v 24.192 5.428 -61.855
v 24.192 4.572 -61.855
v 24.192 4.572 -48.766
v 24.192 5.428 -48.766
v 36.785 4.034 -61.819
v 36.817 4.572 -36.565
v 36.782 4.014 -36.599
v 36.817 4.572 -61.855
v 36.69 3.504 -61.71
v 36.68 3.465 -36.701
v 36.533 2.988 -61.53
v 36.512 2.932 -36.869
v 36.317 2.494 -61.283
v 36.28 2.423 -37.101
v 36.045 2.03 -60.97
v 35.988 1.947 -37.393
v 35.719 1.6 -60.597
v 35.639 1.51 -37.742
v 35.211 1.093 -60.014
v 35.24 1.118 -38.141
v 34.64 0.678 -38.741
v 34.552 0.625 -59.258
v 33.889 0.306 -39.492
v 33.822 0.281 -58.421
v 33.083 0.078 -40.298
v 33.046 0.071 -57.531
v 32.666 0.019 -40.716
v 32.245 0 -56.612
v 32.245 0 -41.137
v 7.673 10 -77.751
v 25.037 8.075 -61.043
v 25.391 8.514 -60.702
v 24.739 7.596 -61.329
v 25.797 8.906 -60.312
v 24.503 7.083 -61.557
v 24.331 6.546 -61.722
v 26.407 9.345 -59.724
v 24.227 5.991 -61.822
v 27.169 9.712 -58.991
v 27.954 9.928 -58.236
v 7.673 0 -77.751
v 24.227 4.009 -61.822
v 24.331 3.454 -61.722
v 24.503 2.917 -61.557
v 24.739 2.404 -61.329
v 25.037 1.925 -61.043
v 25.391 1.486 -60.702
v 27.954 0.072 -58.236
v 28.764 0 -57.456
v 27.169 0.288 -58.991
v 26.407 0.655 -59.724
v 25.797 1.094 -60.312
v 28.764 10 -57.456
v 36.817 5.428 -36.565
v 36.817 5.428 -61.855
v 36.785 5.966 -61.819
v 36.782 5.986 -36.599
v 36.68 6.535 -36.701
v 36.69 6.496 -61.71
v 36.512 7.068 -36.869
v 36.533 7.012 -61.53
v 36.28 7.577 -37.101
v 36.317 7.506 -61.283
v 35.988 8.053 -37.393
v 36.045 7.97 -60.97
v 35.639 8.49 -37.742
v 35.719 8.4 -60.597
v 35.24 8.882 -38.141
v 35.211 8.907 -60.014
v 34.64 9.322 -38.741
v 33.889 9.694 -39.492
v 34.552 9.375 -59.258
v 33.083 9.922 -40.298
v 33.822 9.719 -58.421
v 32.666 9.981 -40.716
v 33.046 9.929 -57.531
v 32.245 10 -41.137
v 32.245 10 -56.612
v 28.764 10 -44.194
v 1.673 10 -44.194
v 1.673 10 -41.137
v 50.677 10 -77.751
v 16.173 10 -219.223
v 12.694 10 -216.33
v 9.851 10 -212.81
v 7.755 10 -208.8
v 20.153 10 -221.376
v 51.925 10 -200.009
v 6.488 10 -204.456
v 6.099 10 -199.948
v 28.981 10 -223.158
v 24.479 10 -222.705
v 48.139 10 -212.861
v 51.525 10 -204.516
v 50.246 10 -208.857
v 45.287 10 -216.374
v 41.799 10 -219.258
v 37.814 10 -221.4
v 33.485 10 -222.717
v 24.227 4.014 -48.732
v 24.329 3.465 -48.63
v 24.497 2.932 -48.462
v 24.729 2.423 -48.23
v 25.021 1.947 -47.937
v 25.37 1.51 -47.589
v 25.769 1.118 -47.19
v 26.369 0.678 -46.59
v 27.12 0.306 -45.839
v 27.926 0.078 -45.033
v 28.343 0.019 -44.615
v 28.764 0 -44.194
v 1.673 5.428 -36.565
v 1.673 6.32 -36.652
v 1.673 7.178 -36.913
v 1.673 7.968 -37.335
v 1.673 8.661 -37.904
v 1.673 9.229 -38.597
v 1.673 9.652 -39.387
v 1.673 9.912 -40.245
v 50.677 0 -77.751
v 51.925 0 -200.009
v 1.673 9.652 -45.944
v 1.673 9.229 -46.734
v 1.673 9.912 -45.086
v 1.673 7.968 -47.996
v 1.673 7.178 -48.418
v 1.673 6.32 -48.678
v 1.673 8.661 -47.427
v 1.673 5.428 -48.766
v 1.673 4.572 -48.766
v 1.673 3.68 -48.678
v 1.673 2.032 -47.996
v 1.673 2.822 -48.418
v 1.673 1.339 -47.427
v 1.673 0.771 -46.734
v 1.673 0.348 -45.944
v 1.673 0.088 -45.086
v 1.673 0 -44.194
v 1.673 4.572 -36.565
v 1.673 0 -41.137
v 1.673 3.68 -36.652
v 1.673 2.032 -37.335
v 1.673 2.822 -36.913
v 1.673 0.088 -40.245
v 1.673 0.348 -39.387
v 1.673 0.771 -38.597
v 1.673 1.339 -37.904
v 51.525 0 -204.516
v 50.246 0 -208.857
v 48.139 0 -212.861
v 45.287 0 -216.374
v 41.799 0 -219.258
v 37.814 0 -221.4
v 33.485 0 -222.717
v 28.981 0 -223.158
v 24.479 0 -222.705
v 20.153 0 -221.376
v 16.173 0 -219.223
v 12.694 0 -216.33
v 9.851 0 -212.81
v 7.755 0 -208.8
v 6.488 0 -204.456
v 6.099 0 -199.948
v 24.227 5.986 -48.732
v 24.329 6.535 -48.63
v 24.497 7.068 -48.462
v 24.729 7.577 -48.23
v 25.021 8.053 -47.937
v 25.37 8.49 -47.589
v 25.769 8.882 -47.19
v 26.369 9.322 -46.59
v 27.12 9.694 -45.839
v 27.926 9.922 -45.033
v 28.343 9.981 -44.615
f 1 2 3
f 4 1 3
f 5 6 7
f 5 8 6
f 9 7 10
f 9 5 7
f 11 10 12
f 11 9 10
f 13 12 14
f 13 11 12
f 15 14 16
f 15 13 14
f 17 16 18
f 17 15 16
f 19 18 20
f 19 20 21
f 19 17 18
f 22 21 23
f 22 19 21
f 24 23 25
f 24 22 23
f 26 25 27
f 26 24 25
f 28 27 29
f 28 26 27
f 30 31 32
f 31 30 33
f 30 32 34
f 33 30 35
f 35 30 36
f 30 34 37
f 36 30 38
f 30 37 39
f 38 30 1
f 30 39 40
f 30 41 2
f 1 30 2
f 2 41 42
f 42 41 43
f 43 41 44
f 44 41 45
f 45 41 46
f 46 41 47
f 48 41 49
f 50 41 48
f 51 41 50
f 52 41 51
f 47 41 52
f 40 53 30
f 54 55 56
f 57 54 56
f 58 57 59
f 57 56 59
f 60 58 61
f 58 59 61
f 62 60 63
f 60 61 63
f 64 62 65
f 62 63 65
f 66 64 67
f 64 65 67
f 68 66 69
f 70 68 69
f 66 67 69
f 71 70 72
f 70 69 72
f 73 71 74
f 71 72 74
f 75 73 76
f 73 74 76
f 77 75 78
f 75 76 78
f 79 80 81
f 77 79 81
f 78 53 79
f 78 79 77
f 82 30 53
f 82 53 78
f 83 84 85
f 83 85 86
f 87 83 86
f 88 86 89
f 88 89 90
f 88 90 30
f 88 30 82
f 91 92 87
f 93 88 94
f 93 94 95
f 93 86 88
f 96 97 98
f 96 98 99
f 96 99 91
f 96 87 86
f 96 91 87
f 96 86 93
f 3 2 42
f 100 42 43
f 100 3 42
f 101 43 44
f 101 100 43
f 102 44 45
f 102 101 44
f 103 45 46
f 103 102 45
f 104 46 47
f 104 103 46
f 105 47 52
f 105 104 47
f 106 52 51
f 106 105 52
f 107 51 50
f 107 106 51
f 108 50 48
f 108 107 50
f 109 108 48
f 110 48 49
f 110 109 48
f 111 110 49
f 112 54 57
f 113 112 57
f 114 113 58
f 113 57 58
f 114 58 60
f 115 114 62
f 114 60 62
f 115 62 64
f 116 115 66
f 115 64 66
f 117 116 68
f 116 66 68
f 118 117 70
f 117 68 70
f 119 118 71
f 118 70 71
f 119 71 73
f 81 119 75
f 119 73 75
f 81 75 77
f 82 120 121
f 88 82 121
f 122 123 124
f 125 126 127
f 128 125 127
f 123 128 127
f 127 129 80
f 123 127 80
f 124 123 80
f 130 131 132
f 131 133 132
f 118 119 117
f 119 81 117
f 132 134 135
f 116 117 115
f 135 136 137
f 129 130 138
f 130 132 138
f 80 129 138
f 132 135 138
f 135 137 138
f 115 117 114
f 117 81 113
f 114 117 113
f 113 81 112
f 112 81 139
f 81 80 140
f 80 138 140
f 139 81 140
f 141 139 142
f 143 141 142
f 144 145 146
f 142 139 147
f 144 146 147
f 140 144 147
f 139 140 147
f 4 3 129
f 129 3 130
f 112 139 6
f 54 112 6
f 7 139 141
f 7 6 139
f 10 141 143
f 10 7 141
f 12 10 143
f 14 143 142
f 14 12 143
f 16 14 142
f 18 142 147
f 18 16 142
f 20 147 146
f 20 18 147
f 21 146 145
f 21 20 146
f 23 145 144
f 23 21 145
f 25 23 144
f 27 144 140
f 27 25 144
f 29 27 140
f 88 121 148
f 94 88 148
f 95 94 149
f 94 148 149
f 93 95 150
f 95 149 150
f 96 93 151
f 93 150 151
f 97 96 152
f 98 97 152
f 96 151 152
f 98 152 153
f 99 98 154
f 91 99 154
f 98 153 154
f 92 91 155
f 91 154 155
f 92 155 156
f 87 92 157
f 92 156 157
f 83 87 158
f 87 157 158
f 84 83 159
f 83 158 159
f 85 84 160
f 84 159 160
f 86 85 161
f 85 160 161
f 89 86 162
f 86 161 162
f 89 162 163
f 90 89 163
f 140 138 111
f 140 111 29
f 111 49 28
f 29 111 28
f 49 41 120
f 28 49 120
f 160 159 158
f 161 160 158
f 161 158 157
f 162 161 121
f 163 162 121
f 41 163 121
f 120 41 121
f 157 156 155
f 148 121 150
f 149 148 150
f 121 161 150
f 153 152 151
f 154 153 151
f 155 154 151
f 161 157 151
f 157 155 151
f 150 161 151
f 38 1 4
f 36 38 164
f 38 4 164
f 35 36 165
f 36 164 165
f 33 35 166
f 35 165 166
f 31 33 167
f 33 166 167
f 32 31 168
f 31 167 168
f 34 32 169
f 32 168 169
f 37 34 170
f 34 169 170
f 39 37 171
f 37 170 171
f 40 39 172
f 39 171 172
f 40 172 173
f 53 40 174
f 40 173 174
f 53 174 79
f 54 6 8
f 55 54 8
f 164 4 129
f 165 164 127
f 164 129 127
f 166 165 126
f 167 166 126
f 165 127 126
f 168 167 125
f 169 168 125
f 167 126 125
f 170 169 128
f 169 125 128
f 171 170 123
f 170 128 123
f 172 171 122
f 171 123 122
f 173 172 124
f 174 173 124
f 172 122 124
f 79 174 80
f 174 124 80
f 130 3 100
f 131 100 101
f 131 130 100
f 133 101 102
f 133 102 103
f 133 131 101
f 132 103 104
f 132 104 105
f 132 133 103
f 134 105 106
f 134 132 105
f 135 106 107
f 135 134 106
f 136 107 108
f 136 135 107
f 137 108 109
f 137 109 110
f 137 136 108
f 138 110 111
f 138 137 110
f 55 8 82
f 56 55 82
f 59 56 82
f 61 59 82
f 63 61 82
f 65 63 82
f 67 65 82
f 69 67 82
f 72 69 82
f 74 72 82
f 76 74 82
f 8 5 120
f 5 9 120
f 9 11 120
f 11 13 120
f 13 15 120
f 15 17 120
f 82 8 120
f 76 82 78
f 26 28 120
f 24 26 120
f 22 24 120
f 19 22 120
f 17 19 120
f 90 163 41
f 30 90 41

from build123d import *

# Parameters (mm, degrees)
BOSS_EXTRUDE1_DEPTH = 10
FILLET1_R           = 4.572


with BuildPart() as part:
    # Sketch2 → Boss-Extrude1 (new body)
    with BuildSketch(Plane(origin=(0, 0, 0), x_dir=(1, 0, 0), z_dir=(0, 1, 0))):
        with BuildLine():
            Line((6.098836138, 199.947644416), (7.673025909, 77.750683868))
            Line((7.673025909, 77.750683868), (24.192411242, 61.855234605))
            Line((24.192411242, 61.855234605), (24.192411242, 48.766267951))
            Line((24.192411242, 48.766267951), (1.672918099, 48.766267951))
            Line((1.672918099, 48.766267951), (1.672918099, 36.564568547))
            Line((1.672918099, 36.564568547), (36.816624548, 36.564568547))
            Line((36.816624548, 36.564568547), (36.816624548, 61.855234605))
            Line((36.816624548, 61.855234605), (50.677233754, 77.750683868))
            Line((50.677233754, 77.750683868), (51.925307167, 200.008903269))
            ThreePointArc((51.925307167, 200.008903269), (28.981086555, 223.157579607), (6.098836138, 199.947644416))
        make_face()
    extrude(amount=BOSS_EXTRUDE1_DEPTH)

    # Fillet1
    fillet1_edges = [part.edges().sort_by_distance(p)[0] for p in [
        (36.816624548, 0, -49.209901576),
        (19.244771323, 0, -36.564568547),
        (12.932664671, 0, -48.766267951),
        (24.192411242, 0, -55.310751278),
        (24.192411242, 10, -55.310751278),
        (12.932664671, 10, -48.766267951),
        (19.244771323, 10, -36.564568547),
        (36.816624548, 10, -49.209901576),
    ]]
    fillet(fillet1_edges, radius=FILLET1_R)


solid = part.part
